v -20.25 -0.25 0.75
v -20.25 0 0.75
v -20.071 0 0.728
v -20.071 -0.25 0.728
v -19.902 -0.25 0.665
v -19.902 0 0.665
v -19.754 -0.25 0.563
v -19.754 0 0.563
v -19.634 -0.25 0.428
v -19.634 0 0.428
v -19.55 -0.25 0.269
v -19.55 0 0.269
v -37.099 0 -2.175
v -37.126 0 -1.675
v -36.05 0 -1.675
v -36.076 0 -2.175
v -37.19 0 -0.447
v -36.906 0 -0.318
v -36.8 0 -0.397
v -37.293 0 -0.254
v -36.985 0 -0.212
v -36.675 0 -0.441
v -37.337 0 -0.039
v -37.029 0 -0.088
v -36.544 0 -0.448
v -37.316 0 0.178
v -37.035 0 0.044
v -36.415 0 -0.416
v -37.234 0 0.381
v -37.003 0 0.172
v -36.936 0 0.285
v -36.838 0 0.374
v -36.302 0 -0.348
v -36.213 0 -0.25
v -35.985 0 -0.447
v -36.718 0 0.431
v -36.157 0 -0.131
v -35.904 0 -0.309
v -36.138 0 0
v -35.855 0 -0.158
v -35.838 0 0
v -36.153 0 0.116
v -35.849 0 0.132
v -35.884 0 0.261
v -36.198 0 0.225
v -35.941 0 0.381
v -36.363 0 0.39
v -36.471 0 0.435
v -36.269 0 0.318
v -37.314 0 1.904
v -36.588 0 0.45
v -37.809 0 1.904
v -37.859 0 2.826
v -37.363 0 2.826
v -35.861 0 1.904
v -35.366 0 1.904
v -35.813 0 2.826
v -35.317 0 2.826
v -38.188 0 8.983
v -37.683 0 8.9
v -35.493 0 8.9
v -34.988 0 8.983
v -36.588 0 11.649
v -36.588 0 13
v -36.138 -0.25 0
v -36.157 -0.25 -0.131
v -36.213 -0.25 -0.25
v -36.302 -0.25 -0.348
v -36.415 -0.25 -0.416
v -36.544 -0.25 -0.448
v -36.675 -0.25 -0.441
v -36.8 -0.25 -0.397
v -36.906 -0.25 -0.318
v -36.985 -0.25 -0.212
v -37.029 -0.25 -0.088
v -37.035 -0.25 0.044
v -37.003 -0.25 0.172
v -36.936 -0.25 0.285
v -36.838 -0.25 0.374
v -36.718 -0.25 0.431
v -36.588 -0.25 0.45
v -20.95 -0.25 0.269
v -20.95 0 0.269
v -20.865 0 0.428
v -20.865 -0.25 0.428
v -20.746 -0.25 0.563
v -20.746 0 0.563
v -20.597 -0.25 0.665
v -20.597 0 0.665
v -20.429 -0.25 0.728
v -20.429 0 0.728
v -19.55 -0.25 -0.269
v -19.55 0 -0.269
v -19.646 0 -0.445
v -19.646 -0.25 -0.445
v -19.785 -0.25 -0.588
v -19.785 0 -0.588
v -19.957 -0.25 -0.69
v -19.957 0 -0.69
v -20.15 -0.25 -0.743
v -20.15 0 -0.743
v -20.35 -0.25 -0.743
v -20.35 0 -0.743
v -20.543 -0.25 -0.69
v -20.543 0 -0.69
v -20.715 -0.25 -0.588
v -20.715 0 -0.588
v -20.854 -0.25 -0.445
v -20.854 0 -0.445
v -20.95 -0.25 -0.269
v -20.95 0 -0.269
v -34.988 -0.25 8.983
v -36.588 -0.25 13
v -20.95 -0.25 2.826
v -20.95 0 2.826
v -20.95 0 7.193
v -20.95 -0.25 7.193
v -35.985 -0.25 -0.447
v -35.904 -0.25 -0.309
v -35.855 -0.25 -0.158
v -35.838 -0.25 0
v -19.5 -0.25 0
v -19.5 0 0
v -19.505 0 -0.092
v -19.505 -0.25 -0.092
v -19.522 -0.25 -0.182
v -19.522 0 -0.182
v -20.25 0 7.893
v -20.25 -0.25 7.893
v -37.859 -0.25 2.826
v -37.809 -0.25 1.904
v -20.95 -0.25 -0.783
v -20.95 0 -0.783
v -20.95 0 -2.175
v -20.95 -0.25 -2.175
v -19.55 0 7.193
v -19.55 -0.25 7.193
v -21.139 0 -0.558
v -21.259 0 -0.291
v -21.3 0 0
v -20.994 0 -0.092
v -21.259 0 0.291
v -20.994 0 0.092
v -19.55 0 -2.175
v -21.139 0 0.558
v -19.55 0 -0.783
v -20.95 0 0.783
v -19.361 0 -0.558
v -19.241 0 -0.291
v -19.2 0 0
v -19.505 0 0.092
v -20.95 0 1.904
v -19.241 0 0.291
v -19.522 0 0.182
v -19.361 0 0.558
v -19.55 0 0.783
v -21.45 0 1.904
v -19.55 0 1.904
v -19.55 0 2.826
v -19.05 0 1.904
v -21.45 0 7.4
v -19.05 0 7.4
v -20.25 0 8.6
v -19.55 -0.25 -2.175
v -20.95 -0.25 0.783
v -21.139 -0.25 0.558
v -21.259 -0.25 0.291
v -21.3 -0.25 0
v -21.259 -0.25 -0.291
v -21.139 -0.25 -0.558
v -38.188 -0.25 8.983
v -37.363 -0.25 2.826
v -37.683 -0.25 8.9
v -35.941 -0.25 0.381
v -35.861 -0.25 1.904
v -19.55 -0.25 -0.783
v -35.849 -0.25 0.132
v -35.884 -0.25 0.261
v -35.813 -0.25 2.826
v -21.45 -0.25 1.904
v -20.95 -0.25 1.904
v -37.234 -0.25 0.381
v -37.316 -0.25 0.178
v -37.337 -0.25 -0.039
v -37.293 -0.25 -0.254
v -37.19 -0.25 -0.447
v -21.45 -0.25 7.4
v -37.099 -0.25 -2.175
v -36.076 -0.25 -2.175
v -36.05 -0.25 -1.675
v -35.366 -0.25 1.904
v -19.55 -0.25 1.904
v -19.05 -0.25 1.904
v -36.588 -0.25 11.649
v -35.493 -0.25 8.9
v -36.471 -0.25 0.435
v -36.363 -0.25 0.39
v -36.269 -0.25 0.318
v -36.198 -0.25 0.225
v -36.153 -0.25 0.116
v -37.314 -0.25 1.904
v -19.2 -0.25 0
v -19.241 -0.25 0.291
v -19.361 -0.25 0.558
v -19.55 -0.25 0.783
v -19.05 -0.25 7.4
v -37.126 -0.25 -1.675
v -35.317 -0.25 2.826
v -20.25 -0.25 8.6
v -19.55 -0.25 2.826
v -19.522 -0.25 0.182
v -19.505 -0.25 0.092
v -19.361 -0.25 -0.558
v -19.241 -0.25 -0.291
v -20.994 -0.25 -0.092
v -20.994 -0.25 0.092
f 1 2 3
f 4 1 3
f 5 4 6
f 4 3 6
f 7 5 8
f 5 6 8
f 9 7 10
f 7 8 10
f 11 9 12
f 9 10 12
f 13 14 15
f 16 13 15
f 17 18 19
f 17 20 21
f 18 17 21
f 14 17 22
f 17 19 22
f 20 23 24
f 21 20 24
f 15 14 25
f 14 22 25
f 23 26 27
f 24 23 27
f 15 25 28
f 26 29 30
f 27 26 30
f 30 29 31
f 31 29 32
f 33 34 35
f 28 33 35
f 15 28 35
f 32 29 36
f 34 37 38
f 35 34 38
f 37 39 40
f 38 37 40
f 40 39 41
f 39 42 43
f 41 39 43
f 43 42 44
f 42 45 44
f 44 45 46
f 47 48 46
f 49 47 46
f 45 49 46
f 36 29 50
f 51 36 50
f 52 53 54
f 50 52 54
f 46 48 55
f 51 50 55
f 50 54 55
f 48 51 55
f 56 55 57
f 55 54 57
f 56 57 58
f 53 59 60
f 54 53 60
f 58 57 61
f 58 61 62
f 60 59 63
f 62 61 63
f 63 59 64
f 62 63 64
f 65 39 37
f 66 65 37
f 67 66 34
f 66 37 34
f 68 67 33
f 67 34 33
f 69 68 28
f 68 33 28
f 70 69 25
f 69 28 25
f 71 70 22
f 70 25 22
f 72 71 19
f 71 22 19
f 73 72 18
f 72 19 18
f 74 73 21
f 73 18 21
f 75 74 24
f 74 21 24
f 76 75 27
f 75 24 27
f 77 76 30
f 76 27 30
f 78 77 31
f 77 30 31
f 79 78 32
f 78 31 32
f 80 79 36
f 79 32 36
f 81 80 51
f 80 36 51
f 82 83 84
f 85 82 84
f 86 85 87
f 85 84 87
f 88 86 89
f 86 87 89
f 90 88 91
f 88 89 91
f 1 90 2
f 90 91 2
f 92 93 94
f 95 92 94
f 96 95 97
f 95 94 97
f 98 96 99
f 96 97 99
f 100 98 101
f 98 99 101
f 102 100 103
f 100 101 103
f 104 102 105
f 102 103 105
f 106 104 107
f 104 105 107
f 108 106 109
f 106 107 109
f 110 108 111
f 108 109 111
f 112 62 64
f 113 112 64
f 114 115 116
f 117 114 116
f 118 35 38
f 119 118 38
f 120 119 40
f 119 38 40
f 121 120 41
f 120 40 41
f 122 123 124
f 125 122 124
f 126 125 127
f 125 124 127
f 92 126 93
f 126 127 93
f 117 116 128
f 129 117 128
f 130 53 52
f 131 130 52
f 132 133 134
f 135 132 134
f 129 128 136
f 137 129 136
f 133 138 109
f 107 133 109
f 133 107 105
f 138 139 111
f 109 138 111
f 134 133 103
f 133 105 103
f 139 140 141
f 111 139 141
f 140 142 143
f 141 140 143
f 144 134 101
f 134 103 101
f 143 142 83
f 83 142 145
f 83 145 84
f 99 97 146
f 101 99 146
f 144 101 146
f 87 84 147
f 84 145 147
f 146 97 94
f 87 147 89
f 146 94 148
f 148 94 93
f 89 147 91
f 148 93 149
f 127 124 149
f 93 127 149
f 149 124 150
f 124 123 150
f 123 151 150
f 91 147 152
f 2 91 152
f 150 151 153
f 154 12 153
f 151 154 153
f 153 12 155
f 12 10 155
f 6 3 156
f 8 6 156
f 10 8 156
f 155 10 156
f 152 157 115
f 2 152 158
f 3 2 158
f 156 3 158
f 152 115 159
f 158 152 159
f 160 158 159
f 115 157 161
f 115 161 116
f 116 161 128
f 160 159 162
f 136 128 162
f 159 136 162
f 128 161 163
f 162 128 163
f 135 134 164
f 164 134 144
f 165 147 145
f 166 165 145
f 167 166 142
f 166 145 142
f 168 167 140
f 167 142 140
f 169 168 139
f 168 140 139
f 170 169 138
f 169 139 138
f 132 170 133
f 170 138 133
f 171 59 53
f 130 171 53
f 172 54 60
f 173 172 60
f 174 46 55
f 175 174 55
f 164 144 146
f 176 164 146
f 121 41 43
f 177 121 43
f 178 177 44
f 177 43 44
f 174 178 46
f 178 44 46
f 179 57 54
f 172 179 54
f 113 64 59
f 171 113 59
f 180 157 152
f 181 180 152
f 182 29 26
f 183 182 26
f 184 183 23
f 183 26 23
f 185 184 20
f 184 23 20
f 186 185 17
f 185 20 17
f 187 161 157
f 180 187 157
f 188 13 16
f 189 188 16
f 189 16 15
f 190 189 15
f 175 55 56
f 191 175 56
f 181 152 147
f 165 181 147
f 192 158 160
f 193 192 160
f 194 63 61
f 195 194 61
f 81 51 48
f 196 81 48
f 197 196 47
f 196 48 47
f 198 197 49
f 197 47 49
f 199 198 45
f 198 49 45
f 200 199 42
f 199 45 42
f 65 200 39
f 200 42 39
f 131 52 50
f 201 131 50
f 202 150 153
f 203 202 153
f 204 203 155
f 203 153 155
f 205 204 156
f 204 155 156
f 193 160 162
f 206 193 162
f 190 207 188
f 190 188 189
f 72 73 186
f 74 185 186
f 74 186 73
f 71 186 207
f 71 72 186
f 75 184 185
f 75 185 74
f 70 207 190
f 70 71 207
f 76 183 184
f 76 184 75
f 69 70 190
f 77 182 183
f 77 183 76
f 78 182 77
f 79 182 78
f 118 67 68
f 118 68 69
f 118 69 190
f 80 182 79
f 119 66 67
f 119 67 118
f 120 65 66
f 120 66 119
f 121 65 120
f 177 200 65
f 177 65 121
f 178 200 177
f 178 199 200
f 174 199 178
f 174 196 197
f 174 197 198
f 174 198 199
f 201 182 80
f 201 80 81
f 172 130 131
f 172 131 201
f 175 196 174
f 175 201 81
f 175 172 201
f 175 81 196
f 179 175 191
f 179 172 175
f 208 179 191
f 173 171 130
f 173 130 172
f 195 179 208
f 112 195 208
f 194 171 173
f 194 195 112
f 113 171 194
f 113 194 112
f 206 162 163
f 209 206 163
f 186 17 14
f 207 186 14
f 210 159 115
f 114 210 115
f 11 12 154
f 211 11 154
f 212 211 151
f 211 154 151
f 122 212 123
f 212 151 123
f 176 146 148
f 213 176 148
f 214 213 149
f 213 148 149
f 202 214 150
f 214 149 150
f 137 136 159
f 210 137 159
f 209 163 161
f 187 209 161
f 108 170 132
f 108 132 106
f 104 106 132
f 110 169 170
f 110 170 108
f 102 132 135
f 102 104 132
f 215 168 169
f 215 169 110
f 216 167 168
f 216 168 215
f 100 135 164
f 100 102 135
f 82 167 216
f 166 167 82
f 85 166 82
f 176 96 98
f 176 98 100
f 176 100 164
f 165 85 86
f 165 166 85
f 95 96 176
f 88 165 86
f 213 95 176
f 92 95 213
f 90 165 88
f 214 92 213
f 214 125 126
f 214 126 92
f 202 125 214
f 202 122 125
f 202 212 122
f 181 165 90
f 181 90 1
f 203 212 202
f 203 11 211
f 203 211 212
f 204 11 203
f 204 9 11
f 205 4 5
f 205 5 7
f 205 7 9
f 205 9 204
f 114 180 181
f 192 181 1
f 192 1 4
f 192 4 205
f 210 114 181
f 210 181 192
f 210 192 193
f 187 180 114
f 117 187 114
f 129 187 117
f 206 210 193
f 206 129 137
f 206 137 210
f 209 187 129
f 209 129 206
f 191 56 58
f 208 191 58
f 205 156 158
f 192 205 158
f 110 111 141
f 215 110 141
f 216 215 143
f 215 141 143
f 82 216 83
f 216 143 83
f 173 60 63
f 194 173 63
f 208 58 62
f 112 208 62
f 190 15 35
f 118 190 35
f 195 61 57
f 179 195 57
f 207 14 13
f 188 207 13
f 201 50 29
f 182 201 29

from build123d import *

# Parameters (mm, degrees)
F1_DEPTH = 0.25
F0_W     = 1.4
F0_H     = 0.5
F0_W_2   = 0.5
F0_H_2   = 0.9224010788
F0_W_3   = 0.7


with BuildPart() as f1:
    # F0 (on Front) → F1 (new body)
    with BuildSketch(Plane.XZ):
        Polygon((-37.0991800716, -2.1753170716), (-36.0761235664, -2.1753170716), (-36.0497890945, -1.6753170716), (-37.1255145435, -1.6753170716), align=None)
        Polygon((-34.987651819, 8.9829219505), (-36.587651819, 13), (-36.587651819, 11.6487521661), (-35.4928014695, 8.8999400996), (-35.8126961933, 2.8262522461), (-35.316756933, 2.8262522461), align=None)
        Polygon((-36.587651819, 11.6487521661), (-36.587651819, 13), (-38.187651819, 8.9829219505), (-37.858546705, 2.8262522461), (-37.3626074446, 2.8262522461), (-37.6825021685, 8.8999400996), align=None)
        with BuildLine():
            ThreePointArc((-35.941497264, 0.380768028), (-36.2155470091, 0.6511820103), (-36.587651819, 0.75))
            ThreePointArc((-36.587651819, 0.75), (-36.9597566288, 0.6511820103), (-37.2338063739, 0.380768028))
            ThreePointArc((-37.2338063739, 0.380768028), (-37.3366137217, -0.0394470323), (-37.1902330591, -0.4465376233))
            ThreePointArc((-37.1902330591, -0.4465376233), (-36.587651819, -0.75), (-35.9850705789, -0.4465376233))
            ThreePointArc((-35.9850705789, -0.4465376233), (-35.8754594538, -0.2351213196), (-35.837651819, 0))
            ThreePointArc((-35.837651819, 0), (-35.8640787694, 0.1973373809), (-35.941497264, 0.380768028))
        make_face()
        with BuildLine():
            ThreePointArc((-36.137651819, 0), (-36.9058498705, -0.3181980515), (-36.587651819, 0.45))
            ThreePointArc((-36.587651819, 0.45), (-36.2694537675, 0.3181980515), (-36.137651819, 0))
        make_face(mode=Mode.SUBTRACT)
        with BuildLine():
            Line((-37.1902330591, -0.4465376233), (-37.1255145435, -1.6753170716))
            Line((-37.1255145435, -1.6753170716), (-36.0497890945, -1.6753170716))
            Line((-36.0497890945, -1.6753170716), (-35.9850705789, -0.4465376233))
            ThreePointArc((-35.9850705789, -0.4465376233), (-36.587651819, -0.75), (-37.1902330591, -0.4465376233))
        make_face()
        with BuildLine():
            Line((-35.8612780839, 1.9038511673), (-36.587651819, 1.9038511673))
            Line((-36.587651819, 1.9038511673), (-36.587651819, 0.75))
            ThreePointArc((-36.587651819, 0.75), (-36.2155470091, 0.6511820103), (-35.941497264, 0.380768028))
            Line((-35.941497264, 0.380768028), (-35.8612780839, 1.9038511673))
        make_face()
        with BuildLine():
            Line((-36.587651819, 0.75), (-36.587651819, 1.9038511673))
            Line((-36.587651819, 1.9038511673), (-37.3140255541, 1.9038511673))
            Line((-37.3140255541, 1.9038511673), (-37.2338063739, 0.380768028))
            ThreePointArc((-37.2338063739, 0.380768028), (-36.9597566288, 0.6511820103), (-36.587651819, 0.75))
        make_face()
        Polygon((-37.3626074446, 2.8262522461), (-37.858546705, 2.8262522461), (-37.8092397051, 1.9038511673), (-37.3140255541, 1.9038511673), align=None)
        Polygon((-36.587651819, 1.9038511673), (-36.587651819, 2.8262522461), (-37.3626074446, 2.8262522461), (-37.3140255541, 1.9038511673), align=None)
        Polygon((-35.8126961933, 2.8262522461), (-36.587651819, 2.8262522461), (-36.587651819, 1.9038511673), (-35.8612780839, 1.9038511673), align=None)
        Polygon((-35.3660639329, 1.9038511673), (-35.316756933, 2.8262522461), (-35.8126961933, 2.8262522461), (-35.8612780839, 1.9038511673), align=None)
    extrude(amount=F1_DEPTH)


with BuildPart() as f1b:
    # F0 (on Front) → F1, piece 2 (new body)
    with BuildSketch(Plane.XZ):
        Polygon((-19.0497518182, 7.4), (-20.2497518182, 8.6), (-20.2497518182, 7.8928932188), (-19.5497518182, 7.1928932188), (-19.5497518182, 2.8262522461), (-19.0497518182, 2.8262522461), align=None)
        Polygon((-21.4497518182, 7.4), (-21.4497518182, 2.8262522461), (-20.9497518182, 2.8262522461), (-20.9497518182, 7.1928932188), (-20.2497518182, 7.8928932188), (-20.2497518182, 8.6), align=None)
        with BuildLine():
            ThreePointArc((-19.5497518182, 0.7826237921), (-19.8750886239, 0.9808809769), (-20.2497518182, 1.05))
            Line((-20.2497518182, 1.05), (-20.2497518182, 0.75))
            ThreePointArc((-20.2497518182, 0.75), (-19.8251600615, 0.618240924), (-19.5497518182, 0.2692582404))
            Line((-19.5497518182, 0.2692582404), (-19.5497518182, 0.7826237921))
        make_face()
        with BuildLine():
            ThreePointArc((-20.2497518182, 1.05), (-20.6244150124, 0.9808809769), (-20.9497518182, 0.7826237921))
            Line((-20.9497518182, 0.7826237921), (-20.9497518182, 0.2692582404))
            ThreePointArc((-20.9497518182, 0.2692582404), (-20.6743435749, 0.618240924), (-20.2497518182, 0.75))
            Line((-20.2497518182, 0.75), (-20.2497518182, 1.05))
        make_face()
        with BuildLine():
            Line((-20.9497518182, 0.2692582404), (-20.9497518182, 0.7826237921))
            ThreePointArc((-20.9497518182, 0.7826237921), (-21.2997518182, 0), (-20.9497518182, -0.7826237921))
            Line((-20.9497518182, -0.7826237921), (-20.9497518182, -0.2692582404))
            ThreePointArc((-20.9497518182, -0.2692582404), (-20.9997518182, 0), (-20.9497518182, 0.2692582404))
        make_face()
        with BuildLine():
            Line((-20.9497518182, -0.2692582404), (-20.9497518182, -0.7826237921))
            ThreePointArc((-20.9497518182, -0.7826237921), (-20.2497518182, -1.05), (-19.5497518182, -0.7826237921))
            Line((-19.5497518182, -0.7826237921), (-19.5497518182, -0.2692582404))
            ThreePointArc((-19.5497518182, -0.2692582404), (-20.2497518182, -0.75), (-20.9497518182, -0.2692582404))
        make_face()
        with BuildLine():
            Line((-19.5497518182, -0.2692582404), (-19.5497518182, -0.7826237921))
            ThreePointArc((-19.5497518182, -0.7826237921), (-19.2912373425, -0.428660705), (-19.1997518182, 0))
            ThreePointArc((-19.1997518182, 0), (-19.2912373425, 0.428660705), (-19.5497518182, 0.7826237921))
            Line((-19.5497518182, 0.7826237921), (-19.5497518182, 0.2692582404))
            ThreePointArc((-19.5497518182, 0.2692582404), (-19.512357758, 0.1369306394), (-19.4997518182, 0))
            ThreePointArc((-19.4997518182, 0), (-19.512357758, -0.1369306394), (-19.5497518182, -0.2692582404))
        make_face()
        with Locations((-20.2497518182, -1.9253170716)):
            Rectangle(F0_W, F0_H)
        with BuildLine():
            Line((-20.9497518182, -0.7826237921), (-20.9497518182, -1.6753170716))
            Line((-20.9497518182, -1.6753170716), (-19.5497518182, -1.6753170716))
            Line((-19.5497518182, -1.6753170716), (-19.5497518182, -0.7826237921))
            ThreePointArc((-19.5497518182, -0.7826237921), (-20.2497518182, -1.05), (-20.9497518182, -0.7826237921))
        make_face()
        with BuildLine():
            Line((-19.5497518182, 1.9038511673), (-20.2497518182, 1.9038511673))
            Line((-20.2497518182, 1.9038511673), (-20.2497518182, 1.05))
            ThreePointArc((-20.2497518182, 1.05), (-19.8750886239, 0.9808809769), (-19.5497518182, 0.7826237921))
            Line((-19.5497518182, 0.7826237921), (-19.5497518182, 1.9038511673))
        make_face()
        with BuildLine():
            Line((-20.2497518182, 1.9038511673), (-20.9497518182, 1.9038511673))
            Line((-20.9497518182, 1.9038511673), (-20.9497518182, 0.7826237921))
            ThreePointArc((-20.9497518182, 0.7826237921), (-20.6244150124, 0.9808809769), (-20.2497518182, 1.05))
            Line((-20.2497518182, 1.05), (-20.2497518182, 1.9038511673))
        make_face()
        with Locations((-21.1997518182, 2.3650517067)):
            Rectangle(F0_W_2, F0_H_2)
        with Locations((-19.2997518182, 2.3650517067)):
            Rectangle(F0_W_2, F0_H_2)
        with Locations((-19.8997518182, 2.3650517067)):
            Rectangle(F0_W_3, F0_H_2)
        with Locations((-20.5997518182, 2.3650517067)):
            Rectangle(F0_W_3, F0_H_2)
    extrude(amount=F1_DEPTH)


solid = Compound([f1.part, f1b.part])
